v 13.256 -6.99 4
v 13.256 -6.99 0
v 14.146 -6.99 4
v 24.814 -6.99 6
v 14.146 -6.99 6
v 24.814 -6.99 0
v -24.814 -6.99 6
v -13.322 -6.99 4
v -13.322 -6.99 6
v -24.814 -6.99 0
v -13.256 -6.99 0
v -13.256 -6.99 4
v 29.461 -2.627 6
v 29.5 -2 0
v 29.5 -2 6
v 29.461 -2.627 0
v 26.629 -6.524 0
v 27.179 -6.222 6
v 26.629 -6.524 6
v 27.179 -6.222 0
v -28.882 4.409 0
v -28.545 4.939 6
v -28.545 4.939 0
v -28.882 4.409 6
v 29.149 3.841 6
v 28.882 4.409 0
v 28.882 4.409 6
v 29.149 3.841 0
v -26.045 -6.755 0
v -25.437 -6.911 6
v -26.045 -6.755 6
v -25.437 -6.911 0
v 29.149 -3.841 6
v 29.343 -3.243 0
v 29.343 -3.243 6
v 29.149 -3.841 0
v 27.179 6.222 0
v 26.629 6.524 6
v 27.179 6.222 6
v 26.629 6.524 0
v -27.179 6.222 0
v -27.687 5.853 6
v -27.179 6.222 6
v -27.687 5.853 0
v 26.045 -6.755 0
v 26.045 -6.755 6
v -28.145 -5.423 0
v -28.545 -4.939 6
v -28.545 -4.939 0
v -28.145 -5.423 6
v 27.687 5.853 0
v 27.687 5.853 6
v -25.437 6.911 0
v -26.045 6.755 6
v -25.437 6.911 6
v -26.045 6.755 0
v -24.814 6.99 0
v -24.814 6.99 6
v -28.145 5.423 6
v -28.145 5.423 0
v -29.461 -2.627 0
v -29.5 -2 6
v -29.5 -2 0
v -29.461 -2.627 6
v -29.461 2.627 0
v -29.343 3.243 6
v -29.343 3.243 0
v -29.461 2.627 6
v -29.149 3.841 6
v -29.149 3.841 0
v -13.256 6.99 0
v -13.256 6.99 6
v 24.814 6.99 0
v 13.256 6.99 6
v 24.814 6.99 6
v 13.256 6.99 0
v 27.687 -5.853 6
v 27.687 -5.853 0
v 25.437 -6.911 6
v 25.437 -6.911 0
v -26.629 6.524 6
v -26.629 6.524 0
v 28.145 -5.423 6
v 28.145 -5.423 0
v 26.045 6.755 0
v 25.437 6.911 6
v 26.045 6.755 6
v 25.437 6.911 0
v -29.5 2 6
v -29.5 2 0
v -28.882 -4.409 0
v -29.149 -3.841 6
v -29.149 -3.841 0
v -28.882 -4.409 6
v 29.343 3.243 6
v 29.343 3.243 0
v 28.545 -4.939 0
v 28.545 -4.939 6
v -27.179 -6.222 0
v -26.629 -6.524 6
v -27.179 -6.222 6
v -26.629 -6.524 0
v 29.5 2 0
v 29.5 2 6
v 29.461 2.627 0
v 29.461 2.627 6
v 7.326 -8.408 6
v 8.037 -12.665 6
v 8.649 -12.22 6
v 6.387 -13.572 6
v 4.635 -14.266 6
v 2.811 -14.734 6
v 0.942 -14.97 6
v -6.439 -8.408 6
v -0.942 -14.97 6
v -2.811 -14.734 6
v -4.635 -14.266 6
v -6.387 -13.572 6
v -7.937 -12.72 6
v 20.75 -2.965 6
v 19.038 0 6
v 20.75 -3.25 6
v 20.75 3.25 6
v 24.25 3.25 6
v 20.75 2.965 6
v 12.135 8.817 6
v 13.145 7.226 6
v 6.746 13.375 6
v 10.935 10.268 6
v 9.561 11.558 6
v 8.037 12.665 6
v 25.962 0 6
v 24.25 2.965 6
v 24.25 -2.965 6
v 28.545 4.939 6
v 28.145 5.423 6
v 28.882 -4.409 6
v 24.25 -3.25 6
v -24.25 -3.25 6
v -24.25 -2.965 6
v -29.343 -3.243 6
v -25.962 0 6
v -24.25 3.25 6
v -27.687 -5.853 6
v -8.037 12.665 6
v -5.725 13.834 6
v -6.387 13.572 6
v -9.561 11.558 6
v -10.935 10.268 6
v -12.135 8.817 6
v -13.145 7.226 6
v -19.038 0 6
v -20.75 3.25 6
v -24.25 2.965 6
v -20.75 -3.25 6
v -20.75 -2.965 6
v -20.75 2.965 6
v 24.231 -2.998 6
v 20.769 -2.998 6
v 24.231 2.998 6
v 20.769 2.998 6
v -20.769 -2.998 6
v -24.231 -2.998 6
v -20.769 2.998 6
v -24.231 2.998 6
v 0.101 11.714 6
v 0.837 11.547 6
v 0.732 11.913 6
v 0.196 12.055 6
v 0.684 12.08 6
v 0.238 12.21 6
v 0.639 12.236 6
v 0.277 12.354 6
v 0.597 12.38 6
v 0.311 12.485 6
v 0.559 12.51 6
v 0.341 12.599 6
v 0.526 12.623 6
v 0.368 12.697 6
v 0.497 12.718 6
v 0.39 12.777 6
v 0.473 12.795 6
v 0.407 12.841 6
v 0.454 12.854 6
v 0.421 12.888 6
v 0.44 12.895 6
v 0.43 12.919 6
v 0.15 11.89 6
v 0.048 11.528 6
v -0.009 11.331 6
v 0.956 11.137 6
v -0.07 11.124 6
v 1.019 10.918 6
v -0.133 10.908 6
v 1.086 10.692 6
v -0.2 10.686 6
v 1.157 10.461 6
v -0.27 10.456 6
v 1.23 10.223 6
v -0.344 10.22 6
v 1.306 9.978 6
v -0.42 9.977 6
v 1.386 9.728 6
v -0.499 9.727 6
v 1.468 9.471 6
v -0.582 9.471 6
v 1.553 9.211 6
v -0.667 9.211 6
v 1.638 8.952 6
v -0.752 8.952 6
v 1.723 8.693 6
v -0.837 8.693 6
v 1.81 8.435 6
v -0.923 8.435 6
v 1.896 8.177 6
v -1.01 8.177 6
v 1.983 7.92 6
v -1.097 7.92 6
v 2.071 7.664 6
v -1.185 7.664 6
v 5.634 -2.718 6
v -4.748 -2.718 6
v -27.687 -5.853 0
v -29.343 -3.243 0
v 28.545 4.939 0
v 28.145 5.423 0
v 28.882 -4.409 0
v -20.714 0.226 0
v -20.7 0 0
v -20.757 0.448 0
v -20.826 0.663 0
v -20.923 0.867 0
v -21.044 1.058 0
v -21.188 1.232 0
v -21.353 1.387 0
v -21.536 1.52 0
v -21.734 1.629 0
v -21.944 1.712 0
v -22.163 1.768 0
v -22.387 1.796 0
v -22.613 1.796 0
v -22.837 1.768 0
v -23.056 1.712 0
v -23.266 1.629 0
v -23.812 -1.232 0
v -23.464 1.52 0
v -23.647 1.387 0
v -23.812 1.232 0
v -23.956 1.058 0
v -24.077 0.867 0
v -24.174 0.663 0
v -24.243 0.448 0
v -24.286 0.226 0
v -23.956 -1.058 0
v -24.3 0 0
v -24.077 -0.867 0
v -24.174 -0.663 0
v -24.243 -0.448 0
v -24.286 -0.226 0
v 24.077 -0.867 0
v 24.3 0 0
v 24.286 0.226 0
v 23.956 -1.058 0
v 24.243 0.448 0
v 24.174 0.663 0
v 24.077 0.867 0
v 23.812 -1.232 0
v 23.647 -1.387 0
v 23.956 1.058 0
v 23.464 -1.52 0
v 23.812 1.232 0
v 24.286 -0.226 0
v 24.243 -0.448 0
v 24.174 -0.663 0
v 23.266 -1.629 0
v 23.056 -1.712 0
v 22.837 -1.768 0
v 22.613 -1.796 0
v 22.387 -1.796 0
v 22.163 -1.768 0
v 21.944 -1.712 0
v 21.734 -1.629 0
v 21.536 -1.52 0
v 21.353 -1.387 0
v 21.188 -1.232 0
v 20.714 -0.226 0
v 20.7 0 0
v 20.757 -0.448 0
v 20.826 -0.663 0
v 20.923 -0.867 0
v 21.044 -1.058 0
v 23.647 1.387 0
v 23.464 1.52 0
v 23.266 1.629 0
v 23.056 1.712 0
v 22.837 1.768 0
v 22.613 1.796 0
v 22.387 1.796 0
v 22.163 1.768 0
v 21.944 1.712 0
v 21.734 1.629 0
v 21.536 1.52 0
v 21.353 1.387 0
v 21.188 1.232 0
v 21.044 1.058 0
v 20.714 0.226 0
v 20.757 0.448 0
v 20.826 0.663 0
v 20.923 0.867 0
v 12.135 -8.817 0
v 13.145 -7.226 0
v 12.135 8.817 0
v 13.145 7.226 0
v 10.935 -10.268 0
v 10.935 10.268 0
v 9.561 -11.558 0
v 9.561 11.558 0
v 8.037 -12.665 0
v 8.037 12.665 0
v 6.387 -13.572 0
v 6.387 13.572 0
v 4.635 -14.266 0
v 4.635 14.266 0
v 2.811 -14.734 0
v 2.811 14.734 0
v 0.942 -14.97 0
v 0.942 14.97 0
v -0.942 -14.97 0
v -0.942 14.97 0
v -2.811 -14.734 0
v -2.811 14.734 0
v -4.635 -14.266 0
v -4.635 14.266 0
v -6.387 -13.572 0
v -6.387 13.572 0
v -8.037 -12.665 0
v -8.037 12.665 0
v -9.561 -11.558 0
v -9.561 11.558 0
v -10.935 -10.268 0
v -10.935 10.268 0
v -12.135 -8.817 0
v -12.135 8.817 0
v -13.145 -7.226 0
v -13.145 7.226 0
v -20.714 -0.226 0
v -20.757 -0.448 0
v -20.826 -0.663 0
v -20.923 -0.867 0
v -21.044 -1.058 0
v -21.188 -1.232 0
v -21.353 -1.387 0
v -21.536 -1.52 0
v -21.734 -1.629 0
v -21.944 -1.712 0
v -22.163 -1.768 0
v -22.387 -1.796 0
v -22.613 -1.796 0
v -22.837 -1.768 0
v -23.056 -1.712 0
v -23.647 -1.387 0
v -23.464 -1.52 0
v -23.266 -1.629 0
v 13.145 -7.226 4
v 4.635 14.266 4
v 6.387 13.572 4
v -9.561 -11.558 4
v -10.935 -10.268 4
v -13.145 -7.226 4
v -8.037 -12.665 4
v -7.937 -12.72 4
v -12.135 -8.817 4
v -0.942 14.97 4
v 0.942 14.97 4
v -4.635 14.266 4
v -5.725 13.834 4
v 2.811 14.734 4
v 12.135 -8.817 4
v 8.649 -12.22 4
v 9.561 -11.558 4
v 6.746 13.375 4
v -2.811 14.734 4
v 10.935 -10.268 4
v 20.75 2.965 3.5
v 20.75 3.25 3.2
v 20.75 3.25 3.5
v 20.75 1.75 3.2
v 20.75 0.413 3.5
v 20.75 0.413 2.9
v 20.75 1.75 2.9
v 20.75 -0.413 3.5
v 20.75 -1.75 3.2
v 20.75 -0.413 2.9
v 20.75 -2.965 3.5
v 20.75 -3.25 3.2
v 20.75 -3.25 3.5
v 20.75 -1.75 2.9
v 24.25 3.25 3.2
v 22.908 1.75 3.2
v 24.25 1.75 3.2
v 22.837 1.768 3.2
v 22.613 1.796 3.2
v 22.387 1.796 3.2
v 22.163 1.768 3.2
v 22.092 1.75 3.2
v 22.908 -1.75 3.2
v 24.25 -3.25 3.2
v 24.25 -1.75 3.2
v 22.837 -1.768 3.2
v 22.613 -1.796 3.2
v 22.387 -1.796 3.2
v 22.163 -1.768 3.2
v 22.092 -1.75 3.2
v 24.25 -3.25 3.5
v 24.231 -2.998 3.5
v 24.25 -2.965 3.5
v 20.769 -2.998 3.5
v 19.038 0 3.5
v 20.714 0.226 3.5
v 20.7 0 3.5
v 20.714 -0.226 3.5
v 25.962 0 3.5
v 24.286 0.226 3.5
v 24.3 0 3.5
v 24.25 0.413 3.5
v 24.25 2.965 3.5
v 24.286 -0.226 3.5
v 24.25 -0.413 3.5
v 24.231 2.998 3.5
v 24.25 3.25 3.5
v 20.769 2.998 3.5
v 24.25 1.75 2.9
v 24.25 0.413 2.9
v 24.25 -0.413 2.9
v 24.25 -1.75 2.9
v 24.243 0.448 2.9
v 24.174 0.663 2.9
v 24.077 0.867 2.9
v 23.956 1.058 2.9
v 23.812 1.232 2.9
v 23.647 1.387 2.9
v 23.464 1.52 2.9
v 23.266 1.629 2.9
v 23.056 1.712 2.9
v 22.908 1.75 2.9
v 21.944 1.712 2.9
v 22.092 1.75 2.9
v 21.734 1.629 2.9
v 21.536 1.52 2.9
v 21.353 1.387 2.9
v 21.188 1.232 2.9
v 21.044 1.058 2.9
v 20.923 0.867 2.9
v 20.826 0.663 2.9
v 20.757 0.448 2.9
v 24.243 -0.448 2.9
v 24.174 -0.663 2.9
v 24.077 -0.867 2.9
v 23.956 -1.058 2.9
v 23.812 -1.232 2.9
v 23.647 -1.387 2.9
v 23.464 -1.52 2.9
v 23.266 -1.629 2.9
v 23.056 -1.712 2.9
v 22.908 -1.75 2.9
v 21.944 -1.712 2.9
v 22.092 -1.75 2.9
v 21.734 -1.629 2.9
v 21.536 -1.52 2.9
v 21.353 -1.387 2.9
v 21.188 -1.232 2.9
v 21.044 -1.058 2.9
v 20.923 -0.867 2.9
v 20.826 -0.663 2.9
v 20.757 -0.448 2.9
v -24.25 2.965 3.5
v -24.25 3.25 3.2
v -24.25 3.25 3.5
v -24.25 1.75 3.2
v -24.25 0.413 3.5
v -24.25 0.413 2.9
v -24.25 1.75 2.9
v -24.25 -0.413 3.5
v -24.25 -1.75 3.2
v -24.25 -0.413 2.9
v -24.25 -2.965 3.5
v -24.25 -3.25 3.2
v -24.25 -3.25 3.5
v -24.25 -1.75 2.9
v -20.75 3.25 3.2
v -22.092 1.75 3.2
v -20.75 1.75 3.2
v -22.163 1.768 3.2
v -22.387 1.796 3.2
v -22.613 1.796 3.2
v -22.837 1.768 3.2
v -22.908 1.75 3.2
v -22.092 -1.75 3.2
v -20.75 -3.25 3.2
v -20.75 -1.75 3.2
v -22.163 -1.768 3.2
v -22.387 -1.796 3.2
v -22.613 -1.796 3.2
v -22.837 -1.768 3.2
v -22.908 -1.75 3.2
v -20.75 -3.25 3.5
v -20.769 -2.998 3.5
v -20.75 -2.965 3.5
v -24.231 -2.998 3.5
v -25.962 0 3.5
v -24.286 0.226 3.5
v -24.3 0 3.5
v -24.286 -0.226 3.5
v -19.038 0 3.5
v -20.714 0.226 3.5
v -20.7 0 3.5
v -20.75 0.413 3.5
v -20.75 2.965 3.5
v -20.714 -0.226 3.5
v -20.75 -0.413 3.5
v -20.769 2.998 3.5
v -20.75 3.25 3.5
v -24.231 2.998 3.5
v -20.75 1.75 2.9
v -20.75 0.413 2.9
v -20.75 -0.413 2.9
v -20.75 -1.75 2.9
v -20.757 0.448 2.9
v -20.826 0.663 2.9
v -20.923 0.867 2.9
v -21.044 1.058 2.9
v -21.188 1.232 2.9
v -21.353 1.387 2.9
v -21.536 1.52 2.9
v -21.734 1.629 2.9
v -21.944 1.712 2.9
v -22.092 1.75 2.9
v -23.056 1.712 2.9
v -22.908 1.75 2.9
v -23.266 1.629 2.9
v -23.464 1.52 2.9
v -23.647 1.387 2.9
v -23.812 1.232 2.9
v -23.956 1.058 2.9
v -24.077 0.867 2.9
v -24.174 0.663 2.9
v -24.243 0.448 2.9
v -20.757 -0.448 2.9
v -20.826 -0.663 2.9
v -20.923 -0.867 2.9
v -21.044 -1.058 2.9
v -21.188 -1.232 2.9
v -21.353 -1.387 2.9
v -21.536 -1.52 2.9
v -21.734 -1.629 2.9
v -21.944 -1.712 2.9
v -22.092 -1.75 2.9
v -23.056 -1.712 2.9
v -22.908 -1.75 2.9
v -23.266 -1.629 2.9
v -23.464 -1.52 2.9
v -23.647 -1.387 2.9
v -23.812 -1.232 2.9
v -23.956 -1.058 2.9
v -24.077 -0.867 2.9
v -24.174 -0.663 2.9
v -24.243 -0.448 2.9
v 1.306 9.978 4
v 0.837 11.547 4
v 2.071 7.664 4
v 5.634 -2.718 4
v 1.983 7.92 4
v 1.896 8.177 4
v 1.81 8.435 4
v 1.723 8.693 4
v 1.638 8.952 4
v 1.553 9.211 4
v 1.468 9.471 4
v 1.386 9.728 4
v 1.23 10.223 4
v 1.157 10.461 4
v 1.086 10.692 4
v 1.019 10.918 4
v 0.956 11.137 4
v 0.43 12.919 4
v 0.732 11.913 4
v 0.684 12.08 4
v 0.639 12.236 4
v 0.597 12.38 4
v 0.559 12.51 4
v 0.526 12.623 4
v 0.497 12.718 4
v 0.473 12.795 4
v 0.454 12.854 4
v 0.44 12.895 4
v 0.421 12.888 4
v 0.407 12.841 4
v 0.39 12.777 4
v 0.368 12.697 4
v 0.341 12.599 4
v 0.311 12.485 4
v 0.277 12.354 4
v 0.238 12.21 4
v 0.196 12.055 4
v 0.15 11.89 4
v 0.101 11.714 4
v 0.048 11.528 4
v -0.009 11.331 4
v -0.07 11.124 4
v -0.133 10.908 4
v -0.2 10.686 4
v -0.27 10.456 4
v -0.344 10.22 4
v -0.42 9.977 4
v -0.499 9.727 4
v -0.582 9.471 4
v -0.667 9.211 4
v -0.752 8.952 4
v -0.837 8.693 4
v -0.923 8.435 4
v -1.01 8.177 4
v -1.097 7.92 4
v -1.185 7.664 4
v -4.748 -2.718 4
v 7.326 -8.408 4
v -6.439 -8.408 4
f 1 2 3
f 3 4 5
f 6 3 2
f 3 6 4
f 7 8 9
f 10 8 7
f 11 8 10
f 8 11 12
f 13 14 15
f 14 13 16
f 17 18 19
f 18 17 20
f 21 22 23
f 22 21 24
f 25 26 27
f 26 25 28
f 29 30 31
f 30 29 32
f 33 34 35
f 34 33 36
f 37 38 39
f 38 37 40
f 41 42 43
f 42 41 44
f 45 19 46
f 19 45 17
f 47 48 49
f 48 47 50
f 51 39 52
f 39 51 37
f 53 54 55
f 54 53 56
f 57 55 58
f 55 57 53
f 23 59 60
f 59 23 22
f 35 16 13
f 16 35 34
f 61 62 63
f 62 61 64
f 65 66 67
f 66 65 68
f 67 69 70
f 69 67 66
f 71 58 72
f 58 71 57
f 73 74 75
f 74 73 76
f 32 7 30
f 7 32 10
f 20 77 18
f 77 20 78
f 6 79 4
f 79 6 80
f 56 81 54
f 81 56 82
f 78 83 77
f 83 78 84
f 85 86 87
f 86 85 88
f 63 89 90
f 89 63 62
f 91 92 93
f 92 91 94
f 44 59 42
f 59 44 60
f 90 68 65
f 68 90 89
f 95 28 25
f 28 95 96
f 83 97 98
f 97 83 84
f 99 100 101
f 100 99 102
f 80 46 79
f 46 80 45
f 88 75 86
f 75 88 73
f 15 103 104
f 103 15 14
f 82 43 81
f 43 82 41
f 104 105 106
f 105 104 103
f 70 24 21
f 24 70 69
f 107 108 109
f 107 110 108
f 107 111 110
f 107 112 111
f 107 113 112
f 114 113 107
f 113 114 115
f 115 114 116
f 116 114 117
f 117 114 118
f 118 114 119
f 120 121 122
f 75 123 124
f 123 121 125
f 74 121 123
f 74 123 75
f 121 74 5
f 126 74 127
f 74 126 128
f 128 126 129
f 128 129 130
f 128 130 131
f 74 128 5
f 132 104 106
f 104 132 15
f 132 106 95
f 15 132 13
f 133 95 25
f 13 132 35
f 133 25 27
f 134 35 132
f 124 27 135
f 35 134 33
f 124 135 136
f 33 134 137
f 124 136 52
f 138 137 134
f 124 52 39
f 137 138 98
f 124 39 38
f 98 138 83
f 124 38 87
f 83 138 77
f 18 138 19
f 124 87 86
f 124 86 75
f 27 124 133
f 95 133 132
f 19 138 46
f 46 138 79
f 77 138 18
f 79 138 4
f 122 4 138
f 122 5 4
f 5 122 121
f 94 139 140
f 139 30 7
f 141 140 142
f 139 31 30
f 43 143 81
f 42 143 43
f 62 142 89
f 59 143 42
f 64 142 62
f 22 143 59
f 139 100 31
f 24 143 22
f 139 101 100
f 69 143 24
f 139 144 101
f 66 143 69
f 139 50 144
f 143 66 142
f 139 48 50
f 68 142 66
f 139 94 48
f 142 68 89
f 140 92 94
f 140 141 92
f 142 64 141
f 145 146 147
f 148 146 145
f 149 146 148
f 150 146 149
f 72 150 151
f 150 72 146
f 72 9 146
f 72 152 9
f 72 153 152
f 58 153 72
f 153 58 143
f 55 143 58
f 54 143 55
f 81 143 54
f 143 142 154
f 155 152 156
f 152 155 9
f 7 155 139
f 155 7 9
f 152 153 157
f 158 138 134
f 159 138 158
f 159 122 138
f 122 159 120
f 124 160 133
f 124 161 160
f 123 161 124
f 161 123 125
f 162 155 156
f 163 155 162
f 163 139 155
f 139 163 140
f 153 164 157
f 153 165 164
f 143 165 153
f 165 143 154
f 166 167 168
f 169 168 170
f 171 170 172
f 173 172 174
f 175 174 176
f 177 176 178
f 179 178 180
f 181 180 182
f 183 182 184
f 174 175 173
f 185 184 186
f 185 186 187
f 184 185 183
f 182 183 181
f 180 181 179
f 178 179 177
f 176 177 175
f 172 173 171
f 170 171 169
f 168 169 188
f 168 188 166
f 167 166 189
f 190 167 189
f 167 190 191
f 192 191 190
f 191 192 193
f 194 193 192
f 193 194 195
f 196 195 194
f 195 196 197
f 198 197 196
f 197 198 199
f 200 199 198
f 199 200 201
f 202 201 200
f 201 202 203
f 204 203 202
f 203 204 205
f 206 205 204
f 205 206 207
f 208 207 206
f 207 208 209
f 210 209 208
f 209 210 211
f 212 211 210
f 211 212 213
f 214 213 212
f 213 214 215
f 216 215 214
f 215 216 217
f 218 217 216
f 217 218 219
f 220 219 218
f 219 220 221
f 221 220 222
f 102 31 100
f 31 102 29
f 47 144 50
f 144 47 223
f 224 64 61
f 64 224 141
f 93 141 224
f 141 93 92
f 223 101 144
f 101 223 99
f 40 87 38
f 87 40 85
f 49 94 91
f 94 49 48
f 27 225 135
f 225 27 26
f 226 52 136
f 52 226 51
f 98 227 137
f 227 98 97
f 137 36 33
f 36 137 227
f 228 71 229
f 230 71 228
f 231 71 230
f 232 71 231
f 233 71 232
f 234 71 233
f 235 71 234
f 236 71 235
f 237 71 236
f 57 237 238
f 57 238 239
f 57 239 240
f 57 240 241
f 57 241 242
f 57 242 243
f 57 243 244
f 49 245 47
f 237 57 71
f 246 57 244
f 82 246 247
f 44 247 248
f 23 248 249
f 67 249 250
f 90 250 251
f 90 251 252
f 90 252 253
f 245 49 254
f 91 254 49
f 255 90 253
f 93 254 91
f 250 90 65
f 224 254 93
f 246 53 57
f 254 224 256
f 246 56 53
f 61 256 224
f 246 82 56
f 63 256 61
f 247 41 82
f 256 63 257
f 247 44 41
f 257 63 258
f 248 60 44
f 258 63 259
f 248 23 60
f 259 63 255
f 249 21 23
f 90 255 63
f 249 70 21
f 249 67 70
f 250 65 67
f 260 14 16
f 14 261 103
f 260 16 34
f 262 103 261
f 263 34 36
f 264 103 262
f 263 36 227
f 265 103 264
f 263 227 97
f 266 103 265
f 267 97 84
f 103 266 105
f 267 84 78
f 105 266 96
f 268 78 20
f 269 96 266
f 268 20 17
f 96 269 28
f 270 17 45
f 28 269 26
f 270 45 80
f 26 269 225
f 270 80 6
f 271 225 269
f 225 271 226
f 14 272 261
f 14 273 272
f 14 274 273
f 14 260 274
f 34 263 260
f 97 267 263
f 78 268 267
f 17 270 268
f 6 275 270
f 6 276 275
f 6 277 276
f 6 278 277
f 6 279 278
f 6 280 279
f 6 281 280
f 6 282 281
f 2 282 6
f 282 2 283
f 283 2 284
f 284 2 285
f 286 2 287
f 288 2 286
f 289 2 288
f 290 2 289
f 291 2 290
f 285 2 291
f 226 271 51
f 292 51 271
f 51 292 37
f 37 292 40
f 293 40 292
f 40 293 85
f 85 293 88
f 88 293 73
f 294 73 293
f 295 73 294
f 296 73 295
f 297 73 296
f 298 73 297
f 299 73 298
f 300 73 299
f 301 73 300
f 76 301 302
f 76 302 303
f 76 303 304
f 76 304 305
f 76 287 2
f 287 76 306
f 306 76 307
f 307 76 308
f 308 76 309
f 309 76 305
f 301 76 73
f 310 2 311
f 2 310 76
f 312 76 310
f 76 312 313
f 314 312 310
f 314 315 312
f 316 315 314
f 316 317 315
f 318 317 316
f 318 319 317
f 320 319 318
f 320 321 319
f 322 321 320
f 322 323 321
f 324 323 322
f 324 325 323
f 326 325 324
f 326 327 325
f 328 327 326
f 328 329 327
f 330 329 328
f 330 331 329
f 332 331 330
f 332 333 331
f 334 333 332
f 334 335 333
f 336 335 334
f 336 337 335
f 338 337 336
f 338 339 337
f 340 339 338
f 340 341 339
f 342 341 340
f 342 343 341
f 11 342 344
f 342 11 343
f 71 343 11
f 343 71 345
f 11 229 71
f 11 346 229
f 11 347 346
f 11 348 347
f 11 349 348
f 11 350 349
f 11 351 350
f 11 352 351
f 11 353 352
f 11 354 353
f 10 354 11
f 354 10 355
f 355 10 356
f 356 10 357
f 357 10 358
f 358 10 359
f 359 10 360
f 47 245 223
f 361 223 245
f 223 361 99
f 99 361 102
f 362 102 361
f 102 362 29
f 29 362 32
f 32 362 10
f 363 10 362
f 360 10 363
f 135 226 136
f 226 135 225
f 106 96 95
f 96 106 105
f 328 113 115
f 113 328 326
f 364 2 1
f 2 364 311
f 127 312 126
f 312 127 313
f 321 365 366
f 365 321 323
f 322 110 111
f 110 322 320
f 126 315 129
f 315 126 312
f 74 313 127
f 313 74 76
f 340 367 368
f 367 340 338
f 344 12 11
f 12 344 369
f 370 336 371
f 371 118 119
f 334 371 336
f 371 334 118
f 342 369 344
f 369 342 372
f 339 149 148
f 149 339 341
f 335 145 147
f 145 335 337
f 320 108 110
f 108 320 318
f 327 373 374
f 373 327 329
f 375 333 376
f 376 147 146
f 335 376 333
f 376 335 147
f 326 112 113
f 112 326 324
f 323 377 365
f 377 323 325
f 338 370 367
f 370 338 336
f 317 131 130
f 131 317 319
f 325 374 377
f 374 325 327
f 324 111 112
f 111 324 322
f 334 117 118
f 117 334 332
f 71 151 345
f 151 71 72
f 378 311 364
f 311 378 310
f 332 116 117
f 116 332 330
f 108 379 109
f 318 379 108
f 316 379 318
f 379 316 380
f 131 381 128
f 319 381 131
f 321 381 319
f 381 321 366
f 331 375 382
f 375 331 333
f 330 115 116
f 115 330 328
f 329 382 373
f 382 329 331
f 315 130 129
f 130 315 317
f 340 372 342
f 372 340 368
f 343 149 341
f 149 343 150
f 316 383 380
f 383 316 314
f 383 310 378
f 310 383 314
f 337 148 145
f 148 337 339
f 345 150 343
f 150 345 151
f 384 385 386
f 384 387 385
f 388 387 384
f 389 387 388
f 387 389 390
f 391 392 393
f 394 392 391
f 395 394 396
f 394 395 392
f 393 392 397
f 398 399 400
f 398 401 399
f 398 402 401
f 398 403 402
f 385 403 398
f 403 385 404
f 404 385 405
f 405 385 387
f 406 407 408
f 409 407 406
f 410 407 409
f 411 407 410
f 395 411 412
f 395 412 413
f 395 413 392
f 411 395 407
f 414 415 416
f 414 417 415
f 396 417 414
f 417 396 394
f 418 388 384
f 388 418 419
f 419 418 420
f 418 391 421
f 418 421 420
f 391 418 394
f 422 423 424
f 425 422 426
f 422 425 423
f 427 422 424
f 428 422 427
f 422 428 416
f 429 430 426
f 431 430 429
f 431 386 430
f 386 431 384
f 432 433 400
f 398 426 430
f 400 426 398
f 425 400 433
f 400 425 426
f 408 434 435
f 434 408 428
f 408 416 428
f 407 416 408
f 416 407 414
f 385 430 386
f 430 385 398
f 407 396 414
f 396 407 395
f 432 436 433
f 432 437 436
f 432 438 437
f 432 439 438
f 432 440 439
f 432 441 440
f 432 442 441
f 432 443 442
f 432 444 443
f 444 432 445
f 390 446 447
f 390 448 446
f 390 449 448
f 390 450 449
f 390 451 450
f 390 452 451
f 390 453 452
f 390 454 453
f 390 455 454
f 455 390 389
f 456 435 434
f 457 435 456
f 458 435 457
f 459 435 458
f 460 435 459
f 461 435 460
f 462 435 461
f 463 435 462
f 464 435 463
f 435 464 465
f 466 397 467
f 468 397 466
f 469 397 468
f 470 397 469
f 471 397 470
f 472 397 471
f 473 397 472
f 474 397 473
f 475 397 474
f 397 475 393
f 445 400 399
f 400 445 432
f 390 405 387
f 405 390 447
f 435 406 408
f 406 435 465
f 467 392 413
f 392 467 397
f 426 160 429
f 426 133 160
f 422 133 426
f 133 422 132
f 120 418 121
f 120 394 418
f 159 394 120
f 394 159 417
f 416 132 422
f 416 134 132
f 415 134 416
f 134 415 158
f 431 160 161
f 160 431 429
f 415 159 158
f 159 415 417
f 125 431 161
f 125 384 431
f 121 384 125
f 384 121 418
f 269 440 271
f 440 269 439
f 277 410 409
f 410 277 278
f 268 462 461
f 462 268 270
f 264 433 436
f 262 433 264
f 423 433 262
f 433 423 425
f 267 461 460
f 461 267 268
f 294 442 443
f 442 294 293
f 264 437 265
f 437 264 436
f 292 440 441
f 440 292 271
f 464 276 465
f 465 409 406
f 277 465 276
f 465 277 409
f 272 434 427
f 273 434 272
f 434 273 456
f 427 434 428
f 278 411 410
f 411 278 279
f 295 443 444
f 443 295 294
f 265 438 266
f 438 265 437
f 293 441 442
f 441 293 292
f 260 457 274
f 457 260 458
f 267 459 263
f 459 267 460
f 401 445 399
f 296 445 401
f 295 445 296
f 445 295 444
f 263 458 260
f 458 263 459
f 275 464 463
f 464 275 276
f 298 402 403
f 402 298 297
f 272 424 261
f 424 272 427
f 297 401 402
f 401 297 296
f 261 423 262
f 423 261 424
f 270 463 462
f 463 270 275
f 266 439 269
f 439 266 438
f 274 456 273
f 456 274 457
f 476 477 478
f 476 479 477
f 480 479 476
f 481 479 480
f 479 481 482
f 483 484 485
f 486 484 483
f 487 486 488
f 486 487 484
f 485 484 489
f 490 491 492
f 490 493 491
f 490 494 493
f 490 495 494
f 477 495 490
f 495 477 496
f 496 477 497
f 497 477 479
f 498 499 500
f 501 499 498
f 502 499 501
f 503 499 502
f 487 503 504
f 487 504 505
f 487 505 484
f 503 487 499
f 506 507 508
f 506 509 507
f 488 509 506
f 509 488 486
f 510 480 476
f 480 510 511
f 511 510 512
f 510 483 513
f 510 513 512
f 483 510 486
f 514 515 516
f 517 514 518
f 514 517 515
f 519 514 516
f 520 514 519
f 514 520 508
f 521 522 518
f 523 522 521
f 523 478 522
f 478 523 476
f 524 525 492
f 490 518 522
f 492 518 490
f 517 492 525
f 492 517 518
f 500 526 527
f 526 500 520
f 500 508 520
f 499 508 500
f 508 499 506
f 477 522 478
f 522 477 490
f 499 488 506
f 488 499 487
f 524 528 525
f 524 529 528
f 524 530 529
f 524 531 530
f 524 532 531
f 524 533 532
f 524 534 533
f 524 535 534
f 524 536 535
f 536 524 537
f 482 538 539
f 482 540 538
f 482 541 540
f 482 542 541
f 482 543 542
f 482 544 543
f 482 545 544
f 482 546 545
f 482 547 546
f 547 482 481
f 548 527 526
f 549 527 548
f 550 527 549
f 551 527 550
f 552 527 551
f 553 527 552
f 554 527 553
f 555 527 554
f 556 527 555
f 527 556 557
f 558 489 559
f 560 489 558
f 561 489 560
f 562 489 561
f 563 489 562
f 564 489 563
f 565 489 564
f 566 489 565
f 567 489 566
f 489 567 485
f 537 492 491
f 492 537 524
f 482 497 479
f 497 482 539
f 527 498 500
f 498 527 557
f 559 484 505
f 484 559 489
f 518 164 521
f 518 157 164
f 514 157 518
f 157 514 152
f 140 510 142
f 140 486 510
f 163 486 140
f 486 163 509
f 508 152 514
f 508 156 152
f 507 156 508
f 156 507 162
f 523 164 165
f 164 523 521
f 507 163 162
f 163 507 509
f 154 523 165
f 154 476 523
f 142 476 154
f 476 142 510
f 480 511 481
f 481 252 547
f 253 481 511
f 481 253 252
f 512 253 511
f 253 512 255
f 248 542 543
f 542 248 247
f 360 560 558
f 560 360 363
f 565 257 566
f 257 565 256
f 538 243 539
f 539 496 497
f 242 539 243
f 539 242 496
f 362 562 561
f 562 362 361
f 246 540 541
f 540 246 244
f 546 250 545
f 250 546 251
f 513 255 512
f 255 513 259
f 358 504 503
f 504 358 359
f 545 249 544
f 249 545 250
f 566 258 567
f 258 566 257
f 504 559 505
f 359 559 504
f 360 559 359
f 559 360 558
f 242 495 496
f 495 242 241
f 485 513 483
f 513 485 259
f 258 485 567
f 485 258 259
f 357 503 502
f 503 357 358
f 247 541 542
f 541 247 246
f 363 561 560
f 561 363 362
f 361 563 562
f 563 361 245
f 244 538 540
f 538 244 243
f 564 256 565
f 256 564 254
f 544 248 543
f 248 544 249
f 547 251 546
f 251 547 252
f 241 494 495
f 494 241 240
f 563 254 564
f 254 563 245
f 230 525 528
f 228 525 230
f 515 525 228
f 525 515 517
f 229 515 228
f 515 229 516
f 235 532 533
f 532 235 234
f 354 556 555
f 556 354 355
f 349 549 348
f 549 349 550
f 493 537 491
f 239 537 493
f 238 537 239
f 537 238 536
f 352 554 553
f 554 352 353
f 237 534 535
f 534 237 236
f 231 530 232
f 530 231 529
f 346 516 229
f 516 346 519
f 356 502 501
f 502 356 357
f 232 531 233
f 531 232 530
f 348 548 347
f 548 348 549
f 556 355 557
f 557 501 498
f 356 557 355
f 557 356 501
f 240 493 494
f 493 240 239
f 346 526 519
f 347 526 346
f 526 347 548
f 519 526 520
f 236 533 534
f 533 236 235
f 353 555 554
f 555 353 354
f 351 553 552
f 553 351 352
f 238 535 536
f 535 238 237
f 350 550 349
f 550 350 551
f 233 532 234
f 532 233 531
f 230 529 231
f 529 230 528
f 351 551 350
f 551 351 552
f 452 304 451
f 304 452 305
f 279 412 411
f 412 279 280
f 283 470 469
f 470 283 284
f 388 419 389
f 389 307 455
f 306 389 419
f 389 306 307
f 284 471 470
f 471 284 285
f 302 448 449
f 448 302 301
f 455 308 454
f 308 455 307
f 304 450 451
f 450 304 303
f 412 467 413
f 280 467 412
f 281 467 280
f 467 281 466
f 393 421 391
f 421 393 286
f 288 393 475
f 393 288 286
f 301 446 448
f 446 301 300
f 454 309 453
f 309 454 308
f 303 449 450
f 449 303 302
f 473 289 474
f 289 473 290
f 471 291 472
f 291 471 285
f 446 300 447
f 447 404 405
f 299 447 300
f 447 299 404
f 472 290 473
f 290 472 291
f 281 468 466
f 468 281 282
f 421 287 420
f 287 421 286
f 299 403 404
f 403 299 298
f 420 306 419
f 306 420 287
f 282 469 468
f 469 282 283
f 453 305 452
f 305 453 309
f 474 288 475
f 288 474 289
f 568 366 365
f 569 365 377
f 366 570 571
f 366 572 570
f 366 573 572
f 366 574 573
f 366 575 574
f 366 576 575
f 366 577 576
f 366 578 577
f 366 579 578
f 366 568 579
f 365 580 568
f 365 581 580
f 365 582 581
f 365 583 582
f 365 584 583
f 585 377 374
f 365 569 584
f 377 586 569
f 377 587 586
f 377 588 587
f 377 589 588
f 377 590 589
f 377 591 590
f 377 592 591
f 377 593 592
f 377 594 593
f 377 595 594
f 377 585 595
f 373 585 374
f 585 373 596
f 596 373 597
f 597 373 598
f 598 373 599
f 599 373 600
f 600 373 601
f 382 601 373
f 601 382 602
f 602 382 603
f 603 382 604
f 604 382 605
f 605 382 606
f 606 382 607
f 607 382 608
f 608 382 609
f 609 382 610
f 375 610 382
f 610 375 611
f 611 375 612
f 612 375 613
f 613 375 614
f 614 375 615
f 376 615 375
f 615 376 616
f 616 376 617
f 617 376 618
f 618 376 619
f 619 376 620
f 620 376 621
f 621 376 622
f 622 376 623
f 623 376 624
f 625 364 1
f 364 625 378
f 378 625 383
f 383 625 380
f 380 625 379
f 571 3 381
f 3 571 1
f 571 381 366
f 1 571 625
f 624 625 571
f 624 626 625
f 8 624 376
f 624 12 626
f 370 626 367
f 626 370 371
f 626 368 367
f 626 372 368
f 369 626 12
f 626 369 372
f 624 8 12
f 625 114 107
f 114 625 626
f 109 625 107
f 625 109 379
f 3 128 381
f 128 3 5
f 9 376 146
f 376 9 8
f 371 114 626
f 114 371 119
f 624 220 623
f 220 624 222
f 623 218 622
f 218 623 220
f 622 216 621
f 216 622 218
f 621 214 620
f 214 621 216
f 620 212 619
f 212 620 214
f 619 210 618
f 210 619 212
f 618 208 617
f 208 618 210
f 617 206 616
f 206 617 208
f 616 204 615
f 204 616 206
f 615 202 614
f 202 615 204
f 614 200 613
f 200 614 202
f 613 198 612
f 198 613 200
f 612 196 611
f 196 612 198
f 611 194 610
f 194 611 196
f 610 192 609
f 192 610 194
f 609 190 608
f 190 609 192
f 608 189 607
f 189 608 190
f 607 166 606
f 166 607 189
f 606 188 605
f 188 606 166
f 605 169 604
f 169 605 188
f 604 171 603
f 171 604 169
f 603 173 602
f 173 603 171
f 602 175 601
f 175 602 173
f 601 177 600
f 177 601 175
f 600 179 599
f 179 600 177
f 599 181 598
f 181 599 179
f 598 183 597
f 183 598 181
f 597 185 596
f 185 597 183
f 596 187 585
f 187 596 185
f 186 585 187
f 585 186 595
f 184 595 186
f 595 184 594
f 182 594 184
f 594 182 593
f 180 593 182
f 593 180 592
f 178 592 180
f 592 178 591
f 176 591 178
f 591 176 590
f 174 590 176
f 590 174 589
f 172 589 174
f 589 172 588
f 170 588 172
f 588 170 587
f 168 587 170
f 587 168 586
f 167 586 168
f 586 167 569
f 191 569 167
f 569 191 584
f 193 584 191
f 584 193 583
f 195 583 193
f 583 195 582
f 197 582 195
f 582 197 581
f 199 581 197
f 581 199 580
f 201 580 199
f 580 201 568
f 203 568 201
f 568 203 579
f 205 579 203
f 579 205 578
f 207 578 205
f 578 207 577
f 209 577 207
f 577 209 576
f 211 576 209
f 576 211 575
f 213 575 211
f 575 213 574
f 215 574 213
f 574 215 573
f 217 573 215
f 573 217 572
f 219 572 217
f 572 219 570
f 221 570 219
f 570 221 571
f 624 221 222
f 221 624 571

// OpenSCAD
$fn = 50;


difference() {
	union() {
		hull() {
			translate(v = [-24.5000000000, 2.0000000000, 0]) {
				cylinder(h = 6, r = 5);
			}
			translate(v = [24.5000000000, 2.0000000000, 0]) {
				cylinder(h = 6, r = 5);
			}
			translate(v = [-24.5000000000, -2.0000000000, 0]) {
				cylinder(h = 6, r = 5);
			}
			translate(v = [24.5000000000, -2.0000000000, 0]) {
				cylinder(h = 6, r = 5);
			}
		}
		cylinder(h = 6, r = 15.0000000000);
	}
	union() {
		translate(v = [22.5000000000, 0, -20]) {
			rotate(a = [0, 180, 0]) {
				difference() {
					union() {
						translate(v = [0, 0, -26.0000000000]) {
							rotate(a = [0, 0, 0]) {
								difference() {
									union() {
										#translate(v = [-1.7500000000, -3.2500000000, -0.3000000000]) {
											cube(size = [3.5000000000, 6.5000000000, 0.3000000000]);
										}
										#translate(v = [-1.7500000000, -1.7500000000, -0.6000000000]) {
											cube(size = [3.5000000000, 3.5000000000, 0.3000000000]);
										}
										#translate(v = [-1.7500000000, -3.2500000000, 2.5000000000]) {
											cube(size = [3.5000000000, 6.5000000000, 0.3000000000]);
										}
										#translate(v = [-1.7500000000, -1.7500000000, 2.8000000000]) {
											cube(size = [3.5000000000, 3.5000000000, 0.3000000000]);
										}
										#linear_extrude(height = 2.5000000000) {
											polygon(points = [[3.4620000000, 0.0000000000], [1.7310000000, 2.9981799479], [-1.7310000000, 2.9981799479], [-3.4620000000, 0.0000000000], [-1.7310000000, -2.9981799479], [1.7310000000, -2.9981799479]]);
										}
										#translate(v = [-1.7500000000, -3.2500000000, -0.3000000000]) {
											cube(size = [3.5000000000, 6.5000000000, 0.3000000000]);
										}
										#translate(v = [-1.7500000000, -1.7500000000, -0.6000000000]) {
											cube(size = [3.5000000000, 3.5000000000, 0.3000000000]);
										}
										#translate(v = [-1.7500000000, -3.2500000000, 2.5000000000]) {
											cube(size = [3.5000000000, 6.5000000000, 0.3000000000]);
										}
										#translate(v = [-1.7500000000, -1.7500000000, 2.8000000000]) {
											cube(size = [3.5000000000, 3.5000000000, 0.3000000000]);
										}
										#translate(v = [-1.7500000000, -3.2500000000, -0.3000000000]) {
											cube(size = [3.5000000000, 6.5000000000, 0.3000000000]);
										}
										#translate(v = [-1.7500000000, -1.7500000000, -0.6000000000]) {
											cube(size = [3.5000000000, 3.5000000000, 0.3000000000]);
										}
										#translate(v = [-1.7500000000, -3.2500000000, 2.5000000000]) {
											cube(size = [3.5000000000, 6.5000000000, 0.3000000000]);
										}
										#translate(v = [-1.7500000000, -1.7500000000, 2.8000000000]) {
											cube(size = [3.5000000000, 3.5000000000, 0.3000000000]);
										}
									}
									union();
								}
							}
						}
						translate(v = [0, 0, -26.0000000000]) {
							rotate(a = [0, 0, 0]) {
								difference() {
									union() {
										#translate(v = [-1.7500000000, -3.2500000000, -0.3000000000]) {
											cube(size = [3.5000000000, 6.5000000000, 0.3000000000]);
										}
										#translate(v = [-1.7500000000, -1.7500000000, -0.6000000000]) {
											cube(size = [3.5000000000, 3.5000000000, 0.3000000000]);
										}
										#translate(v = [-1.7500000000, -3.2500000000, 2.5000000000]) {
											cube(size = [3.5000000000, 6.5000000000, 0.3000000000]);
										}
										#translate(v = [-1.7500000000, -1.7500000000, 2.8000000000]) {
											cube(size = [3.5000000000, 3.5000000000, 0.3000000000]);
										}
										#linear_extrude(height = 2.5000000000) {
											polygon(points = [[3.4620000000, 0.0000000000], [1.7310000000, 2.9981799479], [-1.7310000000, 2.9981799479], [-3.4620000000, 0.0000000000], [-1.7310000000, -2.9981799479], [1.7310000000, -2.9981799479]]);
										}
										#translate(v = [-1.7500000000, -3.2500000000, -0.3000000000]) {
											cube(size = [3.5000000000, 6.5000000000, 0.3000000000]);
										}
										#translate(v = [-1.7500000000, -1.7500000000, -0.6000000000]) {
											cube(size = [3.5000000000, 3.5000000000, 0.3000000000]);
										}
										#translate(v = [-1.7500000000, -3.2500000000, 2.5000000000]) {
											cube(size = [3.5000000000, 6.5000000000, 0.3000000000]);
										}
										#translate(v = [-1.7500000000, -1.7500000000, 2.8000000000]) {
											cube(size = [3.5000000000, 3.5000000000, 0.3000000000]);
										}
										#translate(v = [-1.7500000000, -3.2500000000, -0.3000000000]) {
											cube(size = [3.5000000000, 6.5000000000, 0.3000000000]);
										}
										#translate(v = [-1.7500000000, -1.7500000000, -0.6000000000]) {
											cube(size = [3.5000000000, 3.5000000000, 0.3000000000]);
										}
										#translate(v = [-1.7500000000, -3.2500000000, 2.5000000000]) {
											cube(size = [3.5000000000, 6.5000000000, 0.3000000000]);
										}
										#translate(v = [-1.7500000000, -1.7500000000, 2.8000000000]) {
											cube(size = [3.5000000000, 3.5000000000, 0.3000000000]);
										}
									}
									union();
								}
							}
						}
						translate(v = [0, 0, -26.0000000000]) {
							rotate(a = [0, 0, 0]) {
								difference() {
									union() {
										#translate(v = [-1.7500000000, -3.2500000000, -0.3000000000]) {
											cube(size = [3.5000000000, 6.5000000000, 0.3000000000]);
										}
										#translate(v = [-1.7500000000, -1.7500000000, -0.6000000000]) {
											cube(size = [3.5000000000, 3.5000000000, 0.3000000000]);
										}
										#translate(v = [-1.7500000000, -3.2500000000, 2.5000000000]) {
											cube(size = [3.5000000000, 6.5000000000, 0.3000000000]);
										}
										#translate(v = [-1.7500000000, -1.7500000000, 2.8000000000]) {
											cube(size = [3.5000000000, 3.5000000000, 0.3000000000]);
										}
										#linear_extrude(height = 2.5000000000) {
											polygon(points = [[3.4620000000, 0.0000000000], [1.7310000000, 2.9981799479], [-1.7310000000, 2.9981799479], [-3.4620000000, 0.0000000000], [-1.7310000000, -2.9981799479], [1.7310000000, -2.9981799479]]);
										}
										#translate(v = [-1.7500000000, -3.2500000000, -0.3000000000]) {
											cube(size = [3.5000000000, 6.5000000000, 0.3000000000]);
										}
										#translate(v = [-1.7500000000, -1.7500000000, -0.6000000000]) {
											cube(size = [3.5000000000, 3.5000000000, 0.3000000000]);
										}
										#translate(v = [-1.7500000000, -3.2500000000, 2.5000000000]) {
											cube(size = [3.5000000000, 6.5000000000, 0.3000000000]);
										}
										#translate(v = [-1.7500000000, -1.7500000000, 2.8000000000]) {
											cube(size = [3.5000000000, 3.5000000000, 0.3000000000]);
										}
										#translate(v = [-1.7500000000, -3.2500000000, -0.3000000000]) {
											cube(size = [3.5000000000, 6.5000000000, 0.3000000000]);
										}
										#translate(v = [-1.7500000000, -1.7500000000, -0.6000000000]) {
											cube(size = [3.5000000000, 3.5000000000, 0.3000000000]);
										}
										#translate(v = [-1.7500000000, -3.2500000000, 2.5000000000]) {
											cube(size = [3.5000000000, 6.5000000000, 0.3000000000]);
										}
										#translate(v = [-1.7500000000, -1.7500000000, 2.8000000000]) {
											cube(size = [3.5000000000, 3.5000000000, 0.3000000000]);
										}
									}
									union();
								}
							}
						}
						#translate(v = [0, 0, -26.0000000000]) {
							cylinder(h = 26, r = 1.5000000000);
						}
						#translate(v = [0, 0, -1.9000000000]) {
							cylinder(h = 1.9000000000, r1 = 1.8000000000, r2 = 3.6000000000);
						}
						#translate(v = [0, 0, -26.0000000000]) {
							cylinder(h = 26, r = 1.8000000000);
						}
						#translate(v = [0, 0, -26.0000000000]) {
							cylinder(h = 26, r = 1.5000000000);
						}
					}
					union();
				}
			}
		}
		translate(v = [-22.5000000000, 0, -20]) {
			rotate(a = [0, 180, 0]) {
				difference() {
					union() {
						translate(v = [0, 0, -26.0000000000]) {
							rotate(a = [0, 0, 0]) {
								difference() {
									union() {
										#translate(v = [-1.7500000000, -3.2500000000, -0.3000000000]) {
											cube(size = [3.5000000000, 6.5000000000, 0.3000000000]);
										}
										#translate(v = [-1.7500000000, -1.7500000000, -0.6000000000]) {
											cube(size = [3.5000000000, 3.5000000000, 0.3000000000]);
										}
										#translate(v = [-1.7500000000, -3.2500000000, 2.5000000000]) {
											cube(size = [3.5000000000, 6.5000000000, 0.3000000000]);
										}
										#translate(v = [-1.7500000000, -1.7500000000, 2.8000000000]) {
											cube(size = [3.5000000000, 3.5000000000, 0.3000000000]);
										}
										#linear_extrude(height = 2.5000000000) {
											polygon(points = [[3.4620000000, 0.0000000000], [1.7310000000, 2.9981799479], [-1.7310000000, 2.9981799479], [-3.4620000000, 0.0000000000], [-1.7310000000, -2.9981799479], [1.7310000000, -2.9981799479]]);
										}
										#translate(v = [-1.7500000000, -3.2500000000, -0.3000000000]) {
											cube(size = [3.5000000000, 6.5000000000, 0.3000000000]);
										}
										#translate(v = [-1.7500000000, -1.7500000000, -0.6000000000]) {
											cube(size = [3.5000000000, 3.5000000000, 0.3000000000]);
										}
										#translate(v = [-1.7500000000, -3.2500000000, 2.5000000000]) {
											cube(size = [3.5000000000, 6.5000000000, 0.3000000000]);
										}
										#translate(v = [-1.7500000000, -1.7500000000, 2.8000000000]) {
											cube(size = [3.5000000000, 3.5000000000, 0.3000000000]);
										}
										#translate(v = [-1.7500000000, -3.2500000000, -0.3000000000]) {
											cube(size = [3.5000000000, 6.5000000000, 0.3000000000]);
										}
										#translate(v = [-1.7500000000, -1.7500000000, -0.6000000000]) {
											cube(size = [3.5000000000, 3.5000000000, 0.3000000000]);
										}
										#translate(v = [-1.7500000000, -3.2500000000, 2.5000000000]) {
											cube(size = [3.5000000000, 6.5000000000, 0.3000000000]);
										}
										#translate(v = [-1.7500000000, -1.7500000000, 2.8000000000]) {
											cube(size = [3.5000000000, 3.5000000000, 0.3000000000]);
										}
									}
									union();
								}
							}
						}
						translate(v = [0, 0, -26.0000000000]) {
							rotate(a = [0, 0, 0]) {
								difference() {
									union() {
										#translate(v = [-1.7500000000, -3.2500000000, -0.3000000000]) {
											cube(size = [3.5000000000, 6.5000000000, 0.3000000000]);
										}
										#translate(v = [-1.7500000000, -1.7500000000, -0.6000000000]) {
											cube(size = [3.5000000000, 3.5000000000, 0.3000000000]);
										}
										#translate(v = [-1.7500000000, -3.2500000000, 2.5000000000]) {
											cube(size = [3.5000000000, 6.5000000000, 0.3000000000]);
										}
										#translate(v = [-1.7500000000, -1.7500000000, 2.8000000000]) {
											cube(size = [3.5000000000, 3.5000000000, 0.3000000000]);
										}
										#linear_extrude(height = 2.5000000000) {
											polygon(points = [[3.4620000000, 0.0000000000], [1.7310000000, 2.9981799479], [-1.7310000000, 2.9981799479], [-3.4620000000, 0.0000000000], [-1.7310000000, -2.9981799479], [1.7310000000, -2.9981799479]]);
										}
										#translate(v = [-1.7500000000, -3.2500000000, -0.3000000000]) {
											cube(size = [3.5000000000, 6.5000000000, 0.3000000000]);
										}
										#translate(v = [-1.7500000000, -1.7500000000, -0.6000000000]) {
											cube(size = [3.5000000000, 3.5000000000, 0.3000000000]);
										}
										#translate(v = [-1.7500000000, -3.2500000000, 2.5000000000]) {
											cube(size = [3.5000000000, 6.5000000000, 0.3000000000]);
										}
										#translate(v = [-1.7500000000, -1.7500000000, 2.8000000000]) {
											cube(size = [3.5000000000, 3.5000000000, 0.3000000000]);
										}
										#translate(v = [-1.7500000000, -3.2500000000, -0.3000000000]) {
											cube(size = [3.5000000000, 6.5000000000, 0.3000000000]);
										}
										#translate(v = [-1.7500000000, -1.7500000000, -0.6000000000]) {
											cube(size = [3.5000000000, 3.5000000000, 0.3000000000]);
										}
										#translate(v = [-1.7500000000, -3.2500000000, 2.5000000000]) {
											cube(size = [3.5000000000, 6.5000000000, 0.3000000000]);
										}
										#translate(v = [-1.7500000000, -1.7500000000, 2.8000000000]) {
											cube(size = [3.5000000000, 3.5000000000, 0.3000000000]);
										}
									}
									union();
								}
							}
						}
						translate(v = [0, 0, -26.0000000000]) {
							rotate(a = [0, 0, 0]) {
								difference() {
									union() {
										#translate(v = [-1.7500000000, -3.2500000000, -0.3000000000]) {
											cube(size = [3.5000000000, 6.5000000000, 0.3000000000]);
										}
										#translate(v = [-1.7500000000, -1.7500000000, -0.6000000000]) {
											cube(size = [3.5000000000, 3.5000000000, 0.3000000000]);
										}
										#translate(v = [-1.7500000000, -3.2500000000, 2.5000000000]) {
											cube(size = [3.5000000000, 6.5000000000, 0.3000000000]);
										}
										#translate(v = [-1.7500000000, -1.7500000000, 2.8000000000]) {
											cube(size = [3.5000000000, 3.5000000000, 0.3000000000]);
										}
										#linear_extrude(height = 2.5000000000) {
											polygon(points = [[3.4620000000, 0.0000000000], [1.7310000000, 2.9981799479], [-1.7310000000, 2.9981799479], [-3.4620000000, 0.0000000000], [-1.7310000000, -2.9981799479], [1.7310000000, -2.9981799479]]);
										}
										#translate(v = [-1.7500000000, -3.2500000000, -0.3000000000]) {
											cube(size = [3.5000000000, 6.5000000000, 0.3000000000]);
										}
										#translate(v = [-1.7500000000, -1.7500000000, -0.6000000000]) {
											cube(size = [3.5000000000, 3.5000000000, 0.3000000000]);
										}
										#translate(v = [-1.7500000000, -3.2500000000, 2.5000000000]) {
											cube(size = [3.5000000000, 6.5000000000, 0.3000000000]);
										}
										#translate(v = [-1.7500000000, -1.7500000000, 2.8000000000]) {
											cube(size = [3.5000000000, 3.5000000000, 0.3000000000]);
										}
										#translate(v = [-1.7500000000, -3.2500000000, -0.3000000000]) {
											cube(size = [3.5000000000, 6.5000000000, 0.3000000000]);
										}
										#translate(v = [-1.7500000000, -1.7500000000, -0.6000000000]) {
											cube(size = [3.5000000000, 3.5000000000, 0.3000000000]);
										}
										#translate(v = [-1.7500000000, -3.2500000000, 2.5000000000]) {
											cube(size = [3.5000000000, 6.5000000000, 0.3000000000]);
										}
										#translate(v = [-1.7500000000, -1.7500000000, 2.8000000000]) {
											cube(size = [3.5000000000, 3.5000000000, 0.3000000000]);
										}
									}
									union();
								}
							}
						}
						#translate(v = [0, 0, -26.0000000000]) {
							cylinder(h = 26, r = 1.5000000000);
						}
						#translate(v = [0, 0, -1.9000000000]) {
							cylinder(h = 1.9000000000, r1 = 1.8000000000, r2 = 3.6000000000);
						}
						#translate(v = [0, 0, -26.0000000000]) {
							cylinder(h = 26, r = 1.8000000000);
						}
						#translate(v = [0, 0, -26.0000000000]) {
							cylinder(h = 26, r = 1.5000000000);
						}
					}
					union();
				}
			}
		}
		translate(v = [-22.5000000000, 0.0000000000, 0]) {
			cylinder(h = 6, r = 1.8000000000);
		}
		translate(v = [22.5000000000, 0.0000000000, 0]) {
			cylinder(h = 6, r = 1.8000000000);
		}
		translate(v = [-22.5000000000, 0.0000000000, 0]) {
			cylinder(h = 6, r = 1.8000000000);
		}
		translate(v = [22.5000000000, 0.0000000000, 0]) {
			cylinder(h = 6, r = 1.8000000000);
		}
		translate(v = [-22.5000000000, 0.0000000000, 0]) {
			cylinder(h = 6, r = 1.8000000000);
		}
		translate(v = [22.5000000000, 0.0000000000, 0]) {
			cylinder(h = 6, r = 1.8000000000);
		}
		translate(v = [-22.5000000000, 0.0000000000, 0]) {
			cylinder(h = 6, r = 1.8000000000);
		}
		translate(v = [22.5000000000, 0.0000000000, 0]) {
			cylinder(h = 6, r = 1.8000000000);
		}
		#translate(v = [0, 0, 4]) {
			linear_extrude(height = 2) {
				text(font = "Arial:Bold", halign = "center", size = 37.8000000000, text = "A", valign = "center");
			}
		}
	}
}
